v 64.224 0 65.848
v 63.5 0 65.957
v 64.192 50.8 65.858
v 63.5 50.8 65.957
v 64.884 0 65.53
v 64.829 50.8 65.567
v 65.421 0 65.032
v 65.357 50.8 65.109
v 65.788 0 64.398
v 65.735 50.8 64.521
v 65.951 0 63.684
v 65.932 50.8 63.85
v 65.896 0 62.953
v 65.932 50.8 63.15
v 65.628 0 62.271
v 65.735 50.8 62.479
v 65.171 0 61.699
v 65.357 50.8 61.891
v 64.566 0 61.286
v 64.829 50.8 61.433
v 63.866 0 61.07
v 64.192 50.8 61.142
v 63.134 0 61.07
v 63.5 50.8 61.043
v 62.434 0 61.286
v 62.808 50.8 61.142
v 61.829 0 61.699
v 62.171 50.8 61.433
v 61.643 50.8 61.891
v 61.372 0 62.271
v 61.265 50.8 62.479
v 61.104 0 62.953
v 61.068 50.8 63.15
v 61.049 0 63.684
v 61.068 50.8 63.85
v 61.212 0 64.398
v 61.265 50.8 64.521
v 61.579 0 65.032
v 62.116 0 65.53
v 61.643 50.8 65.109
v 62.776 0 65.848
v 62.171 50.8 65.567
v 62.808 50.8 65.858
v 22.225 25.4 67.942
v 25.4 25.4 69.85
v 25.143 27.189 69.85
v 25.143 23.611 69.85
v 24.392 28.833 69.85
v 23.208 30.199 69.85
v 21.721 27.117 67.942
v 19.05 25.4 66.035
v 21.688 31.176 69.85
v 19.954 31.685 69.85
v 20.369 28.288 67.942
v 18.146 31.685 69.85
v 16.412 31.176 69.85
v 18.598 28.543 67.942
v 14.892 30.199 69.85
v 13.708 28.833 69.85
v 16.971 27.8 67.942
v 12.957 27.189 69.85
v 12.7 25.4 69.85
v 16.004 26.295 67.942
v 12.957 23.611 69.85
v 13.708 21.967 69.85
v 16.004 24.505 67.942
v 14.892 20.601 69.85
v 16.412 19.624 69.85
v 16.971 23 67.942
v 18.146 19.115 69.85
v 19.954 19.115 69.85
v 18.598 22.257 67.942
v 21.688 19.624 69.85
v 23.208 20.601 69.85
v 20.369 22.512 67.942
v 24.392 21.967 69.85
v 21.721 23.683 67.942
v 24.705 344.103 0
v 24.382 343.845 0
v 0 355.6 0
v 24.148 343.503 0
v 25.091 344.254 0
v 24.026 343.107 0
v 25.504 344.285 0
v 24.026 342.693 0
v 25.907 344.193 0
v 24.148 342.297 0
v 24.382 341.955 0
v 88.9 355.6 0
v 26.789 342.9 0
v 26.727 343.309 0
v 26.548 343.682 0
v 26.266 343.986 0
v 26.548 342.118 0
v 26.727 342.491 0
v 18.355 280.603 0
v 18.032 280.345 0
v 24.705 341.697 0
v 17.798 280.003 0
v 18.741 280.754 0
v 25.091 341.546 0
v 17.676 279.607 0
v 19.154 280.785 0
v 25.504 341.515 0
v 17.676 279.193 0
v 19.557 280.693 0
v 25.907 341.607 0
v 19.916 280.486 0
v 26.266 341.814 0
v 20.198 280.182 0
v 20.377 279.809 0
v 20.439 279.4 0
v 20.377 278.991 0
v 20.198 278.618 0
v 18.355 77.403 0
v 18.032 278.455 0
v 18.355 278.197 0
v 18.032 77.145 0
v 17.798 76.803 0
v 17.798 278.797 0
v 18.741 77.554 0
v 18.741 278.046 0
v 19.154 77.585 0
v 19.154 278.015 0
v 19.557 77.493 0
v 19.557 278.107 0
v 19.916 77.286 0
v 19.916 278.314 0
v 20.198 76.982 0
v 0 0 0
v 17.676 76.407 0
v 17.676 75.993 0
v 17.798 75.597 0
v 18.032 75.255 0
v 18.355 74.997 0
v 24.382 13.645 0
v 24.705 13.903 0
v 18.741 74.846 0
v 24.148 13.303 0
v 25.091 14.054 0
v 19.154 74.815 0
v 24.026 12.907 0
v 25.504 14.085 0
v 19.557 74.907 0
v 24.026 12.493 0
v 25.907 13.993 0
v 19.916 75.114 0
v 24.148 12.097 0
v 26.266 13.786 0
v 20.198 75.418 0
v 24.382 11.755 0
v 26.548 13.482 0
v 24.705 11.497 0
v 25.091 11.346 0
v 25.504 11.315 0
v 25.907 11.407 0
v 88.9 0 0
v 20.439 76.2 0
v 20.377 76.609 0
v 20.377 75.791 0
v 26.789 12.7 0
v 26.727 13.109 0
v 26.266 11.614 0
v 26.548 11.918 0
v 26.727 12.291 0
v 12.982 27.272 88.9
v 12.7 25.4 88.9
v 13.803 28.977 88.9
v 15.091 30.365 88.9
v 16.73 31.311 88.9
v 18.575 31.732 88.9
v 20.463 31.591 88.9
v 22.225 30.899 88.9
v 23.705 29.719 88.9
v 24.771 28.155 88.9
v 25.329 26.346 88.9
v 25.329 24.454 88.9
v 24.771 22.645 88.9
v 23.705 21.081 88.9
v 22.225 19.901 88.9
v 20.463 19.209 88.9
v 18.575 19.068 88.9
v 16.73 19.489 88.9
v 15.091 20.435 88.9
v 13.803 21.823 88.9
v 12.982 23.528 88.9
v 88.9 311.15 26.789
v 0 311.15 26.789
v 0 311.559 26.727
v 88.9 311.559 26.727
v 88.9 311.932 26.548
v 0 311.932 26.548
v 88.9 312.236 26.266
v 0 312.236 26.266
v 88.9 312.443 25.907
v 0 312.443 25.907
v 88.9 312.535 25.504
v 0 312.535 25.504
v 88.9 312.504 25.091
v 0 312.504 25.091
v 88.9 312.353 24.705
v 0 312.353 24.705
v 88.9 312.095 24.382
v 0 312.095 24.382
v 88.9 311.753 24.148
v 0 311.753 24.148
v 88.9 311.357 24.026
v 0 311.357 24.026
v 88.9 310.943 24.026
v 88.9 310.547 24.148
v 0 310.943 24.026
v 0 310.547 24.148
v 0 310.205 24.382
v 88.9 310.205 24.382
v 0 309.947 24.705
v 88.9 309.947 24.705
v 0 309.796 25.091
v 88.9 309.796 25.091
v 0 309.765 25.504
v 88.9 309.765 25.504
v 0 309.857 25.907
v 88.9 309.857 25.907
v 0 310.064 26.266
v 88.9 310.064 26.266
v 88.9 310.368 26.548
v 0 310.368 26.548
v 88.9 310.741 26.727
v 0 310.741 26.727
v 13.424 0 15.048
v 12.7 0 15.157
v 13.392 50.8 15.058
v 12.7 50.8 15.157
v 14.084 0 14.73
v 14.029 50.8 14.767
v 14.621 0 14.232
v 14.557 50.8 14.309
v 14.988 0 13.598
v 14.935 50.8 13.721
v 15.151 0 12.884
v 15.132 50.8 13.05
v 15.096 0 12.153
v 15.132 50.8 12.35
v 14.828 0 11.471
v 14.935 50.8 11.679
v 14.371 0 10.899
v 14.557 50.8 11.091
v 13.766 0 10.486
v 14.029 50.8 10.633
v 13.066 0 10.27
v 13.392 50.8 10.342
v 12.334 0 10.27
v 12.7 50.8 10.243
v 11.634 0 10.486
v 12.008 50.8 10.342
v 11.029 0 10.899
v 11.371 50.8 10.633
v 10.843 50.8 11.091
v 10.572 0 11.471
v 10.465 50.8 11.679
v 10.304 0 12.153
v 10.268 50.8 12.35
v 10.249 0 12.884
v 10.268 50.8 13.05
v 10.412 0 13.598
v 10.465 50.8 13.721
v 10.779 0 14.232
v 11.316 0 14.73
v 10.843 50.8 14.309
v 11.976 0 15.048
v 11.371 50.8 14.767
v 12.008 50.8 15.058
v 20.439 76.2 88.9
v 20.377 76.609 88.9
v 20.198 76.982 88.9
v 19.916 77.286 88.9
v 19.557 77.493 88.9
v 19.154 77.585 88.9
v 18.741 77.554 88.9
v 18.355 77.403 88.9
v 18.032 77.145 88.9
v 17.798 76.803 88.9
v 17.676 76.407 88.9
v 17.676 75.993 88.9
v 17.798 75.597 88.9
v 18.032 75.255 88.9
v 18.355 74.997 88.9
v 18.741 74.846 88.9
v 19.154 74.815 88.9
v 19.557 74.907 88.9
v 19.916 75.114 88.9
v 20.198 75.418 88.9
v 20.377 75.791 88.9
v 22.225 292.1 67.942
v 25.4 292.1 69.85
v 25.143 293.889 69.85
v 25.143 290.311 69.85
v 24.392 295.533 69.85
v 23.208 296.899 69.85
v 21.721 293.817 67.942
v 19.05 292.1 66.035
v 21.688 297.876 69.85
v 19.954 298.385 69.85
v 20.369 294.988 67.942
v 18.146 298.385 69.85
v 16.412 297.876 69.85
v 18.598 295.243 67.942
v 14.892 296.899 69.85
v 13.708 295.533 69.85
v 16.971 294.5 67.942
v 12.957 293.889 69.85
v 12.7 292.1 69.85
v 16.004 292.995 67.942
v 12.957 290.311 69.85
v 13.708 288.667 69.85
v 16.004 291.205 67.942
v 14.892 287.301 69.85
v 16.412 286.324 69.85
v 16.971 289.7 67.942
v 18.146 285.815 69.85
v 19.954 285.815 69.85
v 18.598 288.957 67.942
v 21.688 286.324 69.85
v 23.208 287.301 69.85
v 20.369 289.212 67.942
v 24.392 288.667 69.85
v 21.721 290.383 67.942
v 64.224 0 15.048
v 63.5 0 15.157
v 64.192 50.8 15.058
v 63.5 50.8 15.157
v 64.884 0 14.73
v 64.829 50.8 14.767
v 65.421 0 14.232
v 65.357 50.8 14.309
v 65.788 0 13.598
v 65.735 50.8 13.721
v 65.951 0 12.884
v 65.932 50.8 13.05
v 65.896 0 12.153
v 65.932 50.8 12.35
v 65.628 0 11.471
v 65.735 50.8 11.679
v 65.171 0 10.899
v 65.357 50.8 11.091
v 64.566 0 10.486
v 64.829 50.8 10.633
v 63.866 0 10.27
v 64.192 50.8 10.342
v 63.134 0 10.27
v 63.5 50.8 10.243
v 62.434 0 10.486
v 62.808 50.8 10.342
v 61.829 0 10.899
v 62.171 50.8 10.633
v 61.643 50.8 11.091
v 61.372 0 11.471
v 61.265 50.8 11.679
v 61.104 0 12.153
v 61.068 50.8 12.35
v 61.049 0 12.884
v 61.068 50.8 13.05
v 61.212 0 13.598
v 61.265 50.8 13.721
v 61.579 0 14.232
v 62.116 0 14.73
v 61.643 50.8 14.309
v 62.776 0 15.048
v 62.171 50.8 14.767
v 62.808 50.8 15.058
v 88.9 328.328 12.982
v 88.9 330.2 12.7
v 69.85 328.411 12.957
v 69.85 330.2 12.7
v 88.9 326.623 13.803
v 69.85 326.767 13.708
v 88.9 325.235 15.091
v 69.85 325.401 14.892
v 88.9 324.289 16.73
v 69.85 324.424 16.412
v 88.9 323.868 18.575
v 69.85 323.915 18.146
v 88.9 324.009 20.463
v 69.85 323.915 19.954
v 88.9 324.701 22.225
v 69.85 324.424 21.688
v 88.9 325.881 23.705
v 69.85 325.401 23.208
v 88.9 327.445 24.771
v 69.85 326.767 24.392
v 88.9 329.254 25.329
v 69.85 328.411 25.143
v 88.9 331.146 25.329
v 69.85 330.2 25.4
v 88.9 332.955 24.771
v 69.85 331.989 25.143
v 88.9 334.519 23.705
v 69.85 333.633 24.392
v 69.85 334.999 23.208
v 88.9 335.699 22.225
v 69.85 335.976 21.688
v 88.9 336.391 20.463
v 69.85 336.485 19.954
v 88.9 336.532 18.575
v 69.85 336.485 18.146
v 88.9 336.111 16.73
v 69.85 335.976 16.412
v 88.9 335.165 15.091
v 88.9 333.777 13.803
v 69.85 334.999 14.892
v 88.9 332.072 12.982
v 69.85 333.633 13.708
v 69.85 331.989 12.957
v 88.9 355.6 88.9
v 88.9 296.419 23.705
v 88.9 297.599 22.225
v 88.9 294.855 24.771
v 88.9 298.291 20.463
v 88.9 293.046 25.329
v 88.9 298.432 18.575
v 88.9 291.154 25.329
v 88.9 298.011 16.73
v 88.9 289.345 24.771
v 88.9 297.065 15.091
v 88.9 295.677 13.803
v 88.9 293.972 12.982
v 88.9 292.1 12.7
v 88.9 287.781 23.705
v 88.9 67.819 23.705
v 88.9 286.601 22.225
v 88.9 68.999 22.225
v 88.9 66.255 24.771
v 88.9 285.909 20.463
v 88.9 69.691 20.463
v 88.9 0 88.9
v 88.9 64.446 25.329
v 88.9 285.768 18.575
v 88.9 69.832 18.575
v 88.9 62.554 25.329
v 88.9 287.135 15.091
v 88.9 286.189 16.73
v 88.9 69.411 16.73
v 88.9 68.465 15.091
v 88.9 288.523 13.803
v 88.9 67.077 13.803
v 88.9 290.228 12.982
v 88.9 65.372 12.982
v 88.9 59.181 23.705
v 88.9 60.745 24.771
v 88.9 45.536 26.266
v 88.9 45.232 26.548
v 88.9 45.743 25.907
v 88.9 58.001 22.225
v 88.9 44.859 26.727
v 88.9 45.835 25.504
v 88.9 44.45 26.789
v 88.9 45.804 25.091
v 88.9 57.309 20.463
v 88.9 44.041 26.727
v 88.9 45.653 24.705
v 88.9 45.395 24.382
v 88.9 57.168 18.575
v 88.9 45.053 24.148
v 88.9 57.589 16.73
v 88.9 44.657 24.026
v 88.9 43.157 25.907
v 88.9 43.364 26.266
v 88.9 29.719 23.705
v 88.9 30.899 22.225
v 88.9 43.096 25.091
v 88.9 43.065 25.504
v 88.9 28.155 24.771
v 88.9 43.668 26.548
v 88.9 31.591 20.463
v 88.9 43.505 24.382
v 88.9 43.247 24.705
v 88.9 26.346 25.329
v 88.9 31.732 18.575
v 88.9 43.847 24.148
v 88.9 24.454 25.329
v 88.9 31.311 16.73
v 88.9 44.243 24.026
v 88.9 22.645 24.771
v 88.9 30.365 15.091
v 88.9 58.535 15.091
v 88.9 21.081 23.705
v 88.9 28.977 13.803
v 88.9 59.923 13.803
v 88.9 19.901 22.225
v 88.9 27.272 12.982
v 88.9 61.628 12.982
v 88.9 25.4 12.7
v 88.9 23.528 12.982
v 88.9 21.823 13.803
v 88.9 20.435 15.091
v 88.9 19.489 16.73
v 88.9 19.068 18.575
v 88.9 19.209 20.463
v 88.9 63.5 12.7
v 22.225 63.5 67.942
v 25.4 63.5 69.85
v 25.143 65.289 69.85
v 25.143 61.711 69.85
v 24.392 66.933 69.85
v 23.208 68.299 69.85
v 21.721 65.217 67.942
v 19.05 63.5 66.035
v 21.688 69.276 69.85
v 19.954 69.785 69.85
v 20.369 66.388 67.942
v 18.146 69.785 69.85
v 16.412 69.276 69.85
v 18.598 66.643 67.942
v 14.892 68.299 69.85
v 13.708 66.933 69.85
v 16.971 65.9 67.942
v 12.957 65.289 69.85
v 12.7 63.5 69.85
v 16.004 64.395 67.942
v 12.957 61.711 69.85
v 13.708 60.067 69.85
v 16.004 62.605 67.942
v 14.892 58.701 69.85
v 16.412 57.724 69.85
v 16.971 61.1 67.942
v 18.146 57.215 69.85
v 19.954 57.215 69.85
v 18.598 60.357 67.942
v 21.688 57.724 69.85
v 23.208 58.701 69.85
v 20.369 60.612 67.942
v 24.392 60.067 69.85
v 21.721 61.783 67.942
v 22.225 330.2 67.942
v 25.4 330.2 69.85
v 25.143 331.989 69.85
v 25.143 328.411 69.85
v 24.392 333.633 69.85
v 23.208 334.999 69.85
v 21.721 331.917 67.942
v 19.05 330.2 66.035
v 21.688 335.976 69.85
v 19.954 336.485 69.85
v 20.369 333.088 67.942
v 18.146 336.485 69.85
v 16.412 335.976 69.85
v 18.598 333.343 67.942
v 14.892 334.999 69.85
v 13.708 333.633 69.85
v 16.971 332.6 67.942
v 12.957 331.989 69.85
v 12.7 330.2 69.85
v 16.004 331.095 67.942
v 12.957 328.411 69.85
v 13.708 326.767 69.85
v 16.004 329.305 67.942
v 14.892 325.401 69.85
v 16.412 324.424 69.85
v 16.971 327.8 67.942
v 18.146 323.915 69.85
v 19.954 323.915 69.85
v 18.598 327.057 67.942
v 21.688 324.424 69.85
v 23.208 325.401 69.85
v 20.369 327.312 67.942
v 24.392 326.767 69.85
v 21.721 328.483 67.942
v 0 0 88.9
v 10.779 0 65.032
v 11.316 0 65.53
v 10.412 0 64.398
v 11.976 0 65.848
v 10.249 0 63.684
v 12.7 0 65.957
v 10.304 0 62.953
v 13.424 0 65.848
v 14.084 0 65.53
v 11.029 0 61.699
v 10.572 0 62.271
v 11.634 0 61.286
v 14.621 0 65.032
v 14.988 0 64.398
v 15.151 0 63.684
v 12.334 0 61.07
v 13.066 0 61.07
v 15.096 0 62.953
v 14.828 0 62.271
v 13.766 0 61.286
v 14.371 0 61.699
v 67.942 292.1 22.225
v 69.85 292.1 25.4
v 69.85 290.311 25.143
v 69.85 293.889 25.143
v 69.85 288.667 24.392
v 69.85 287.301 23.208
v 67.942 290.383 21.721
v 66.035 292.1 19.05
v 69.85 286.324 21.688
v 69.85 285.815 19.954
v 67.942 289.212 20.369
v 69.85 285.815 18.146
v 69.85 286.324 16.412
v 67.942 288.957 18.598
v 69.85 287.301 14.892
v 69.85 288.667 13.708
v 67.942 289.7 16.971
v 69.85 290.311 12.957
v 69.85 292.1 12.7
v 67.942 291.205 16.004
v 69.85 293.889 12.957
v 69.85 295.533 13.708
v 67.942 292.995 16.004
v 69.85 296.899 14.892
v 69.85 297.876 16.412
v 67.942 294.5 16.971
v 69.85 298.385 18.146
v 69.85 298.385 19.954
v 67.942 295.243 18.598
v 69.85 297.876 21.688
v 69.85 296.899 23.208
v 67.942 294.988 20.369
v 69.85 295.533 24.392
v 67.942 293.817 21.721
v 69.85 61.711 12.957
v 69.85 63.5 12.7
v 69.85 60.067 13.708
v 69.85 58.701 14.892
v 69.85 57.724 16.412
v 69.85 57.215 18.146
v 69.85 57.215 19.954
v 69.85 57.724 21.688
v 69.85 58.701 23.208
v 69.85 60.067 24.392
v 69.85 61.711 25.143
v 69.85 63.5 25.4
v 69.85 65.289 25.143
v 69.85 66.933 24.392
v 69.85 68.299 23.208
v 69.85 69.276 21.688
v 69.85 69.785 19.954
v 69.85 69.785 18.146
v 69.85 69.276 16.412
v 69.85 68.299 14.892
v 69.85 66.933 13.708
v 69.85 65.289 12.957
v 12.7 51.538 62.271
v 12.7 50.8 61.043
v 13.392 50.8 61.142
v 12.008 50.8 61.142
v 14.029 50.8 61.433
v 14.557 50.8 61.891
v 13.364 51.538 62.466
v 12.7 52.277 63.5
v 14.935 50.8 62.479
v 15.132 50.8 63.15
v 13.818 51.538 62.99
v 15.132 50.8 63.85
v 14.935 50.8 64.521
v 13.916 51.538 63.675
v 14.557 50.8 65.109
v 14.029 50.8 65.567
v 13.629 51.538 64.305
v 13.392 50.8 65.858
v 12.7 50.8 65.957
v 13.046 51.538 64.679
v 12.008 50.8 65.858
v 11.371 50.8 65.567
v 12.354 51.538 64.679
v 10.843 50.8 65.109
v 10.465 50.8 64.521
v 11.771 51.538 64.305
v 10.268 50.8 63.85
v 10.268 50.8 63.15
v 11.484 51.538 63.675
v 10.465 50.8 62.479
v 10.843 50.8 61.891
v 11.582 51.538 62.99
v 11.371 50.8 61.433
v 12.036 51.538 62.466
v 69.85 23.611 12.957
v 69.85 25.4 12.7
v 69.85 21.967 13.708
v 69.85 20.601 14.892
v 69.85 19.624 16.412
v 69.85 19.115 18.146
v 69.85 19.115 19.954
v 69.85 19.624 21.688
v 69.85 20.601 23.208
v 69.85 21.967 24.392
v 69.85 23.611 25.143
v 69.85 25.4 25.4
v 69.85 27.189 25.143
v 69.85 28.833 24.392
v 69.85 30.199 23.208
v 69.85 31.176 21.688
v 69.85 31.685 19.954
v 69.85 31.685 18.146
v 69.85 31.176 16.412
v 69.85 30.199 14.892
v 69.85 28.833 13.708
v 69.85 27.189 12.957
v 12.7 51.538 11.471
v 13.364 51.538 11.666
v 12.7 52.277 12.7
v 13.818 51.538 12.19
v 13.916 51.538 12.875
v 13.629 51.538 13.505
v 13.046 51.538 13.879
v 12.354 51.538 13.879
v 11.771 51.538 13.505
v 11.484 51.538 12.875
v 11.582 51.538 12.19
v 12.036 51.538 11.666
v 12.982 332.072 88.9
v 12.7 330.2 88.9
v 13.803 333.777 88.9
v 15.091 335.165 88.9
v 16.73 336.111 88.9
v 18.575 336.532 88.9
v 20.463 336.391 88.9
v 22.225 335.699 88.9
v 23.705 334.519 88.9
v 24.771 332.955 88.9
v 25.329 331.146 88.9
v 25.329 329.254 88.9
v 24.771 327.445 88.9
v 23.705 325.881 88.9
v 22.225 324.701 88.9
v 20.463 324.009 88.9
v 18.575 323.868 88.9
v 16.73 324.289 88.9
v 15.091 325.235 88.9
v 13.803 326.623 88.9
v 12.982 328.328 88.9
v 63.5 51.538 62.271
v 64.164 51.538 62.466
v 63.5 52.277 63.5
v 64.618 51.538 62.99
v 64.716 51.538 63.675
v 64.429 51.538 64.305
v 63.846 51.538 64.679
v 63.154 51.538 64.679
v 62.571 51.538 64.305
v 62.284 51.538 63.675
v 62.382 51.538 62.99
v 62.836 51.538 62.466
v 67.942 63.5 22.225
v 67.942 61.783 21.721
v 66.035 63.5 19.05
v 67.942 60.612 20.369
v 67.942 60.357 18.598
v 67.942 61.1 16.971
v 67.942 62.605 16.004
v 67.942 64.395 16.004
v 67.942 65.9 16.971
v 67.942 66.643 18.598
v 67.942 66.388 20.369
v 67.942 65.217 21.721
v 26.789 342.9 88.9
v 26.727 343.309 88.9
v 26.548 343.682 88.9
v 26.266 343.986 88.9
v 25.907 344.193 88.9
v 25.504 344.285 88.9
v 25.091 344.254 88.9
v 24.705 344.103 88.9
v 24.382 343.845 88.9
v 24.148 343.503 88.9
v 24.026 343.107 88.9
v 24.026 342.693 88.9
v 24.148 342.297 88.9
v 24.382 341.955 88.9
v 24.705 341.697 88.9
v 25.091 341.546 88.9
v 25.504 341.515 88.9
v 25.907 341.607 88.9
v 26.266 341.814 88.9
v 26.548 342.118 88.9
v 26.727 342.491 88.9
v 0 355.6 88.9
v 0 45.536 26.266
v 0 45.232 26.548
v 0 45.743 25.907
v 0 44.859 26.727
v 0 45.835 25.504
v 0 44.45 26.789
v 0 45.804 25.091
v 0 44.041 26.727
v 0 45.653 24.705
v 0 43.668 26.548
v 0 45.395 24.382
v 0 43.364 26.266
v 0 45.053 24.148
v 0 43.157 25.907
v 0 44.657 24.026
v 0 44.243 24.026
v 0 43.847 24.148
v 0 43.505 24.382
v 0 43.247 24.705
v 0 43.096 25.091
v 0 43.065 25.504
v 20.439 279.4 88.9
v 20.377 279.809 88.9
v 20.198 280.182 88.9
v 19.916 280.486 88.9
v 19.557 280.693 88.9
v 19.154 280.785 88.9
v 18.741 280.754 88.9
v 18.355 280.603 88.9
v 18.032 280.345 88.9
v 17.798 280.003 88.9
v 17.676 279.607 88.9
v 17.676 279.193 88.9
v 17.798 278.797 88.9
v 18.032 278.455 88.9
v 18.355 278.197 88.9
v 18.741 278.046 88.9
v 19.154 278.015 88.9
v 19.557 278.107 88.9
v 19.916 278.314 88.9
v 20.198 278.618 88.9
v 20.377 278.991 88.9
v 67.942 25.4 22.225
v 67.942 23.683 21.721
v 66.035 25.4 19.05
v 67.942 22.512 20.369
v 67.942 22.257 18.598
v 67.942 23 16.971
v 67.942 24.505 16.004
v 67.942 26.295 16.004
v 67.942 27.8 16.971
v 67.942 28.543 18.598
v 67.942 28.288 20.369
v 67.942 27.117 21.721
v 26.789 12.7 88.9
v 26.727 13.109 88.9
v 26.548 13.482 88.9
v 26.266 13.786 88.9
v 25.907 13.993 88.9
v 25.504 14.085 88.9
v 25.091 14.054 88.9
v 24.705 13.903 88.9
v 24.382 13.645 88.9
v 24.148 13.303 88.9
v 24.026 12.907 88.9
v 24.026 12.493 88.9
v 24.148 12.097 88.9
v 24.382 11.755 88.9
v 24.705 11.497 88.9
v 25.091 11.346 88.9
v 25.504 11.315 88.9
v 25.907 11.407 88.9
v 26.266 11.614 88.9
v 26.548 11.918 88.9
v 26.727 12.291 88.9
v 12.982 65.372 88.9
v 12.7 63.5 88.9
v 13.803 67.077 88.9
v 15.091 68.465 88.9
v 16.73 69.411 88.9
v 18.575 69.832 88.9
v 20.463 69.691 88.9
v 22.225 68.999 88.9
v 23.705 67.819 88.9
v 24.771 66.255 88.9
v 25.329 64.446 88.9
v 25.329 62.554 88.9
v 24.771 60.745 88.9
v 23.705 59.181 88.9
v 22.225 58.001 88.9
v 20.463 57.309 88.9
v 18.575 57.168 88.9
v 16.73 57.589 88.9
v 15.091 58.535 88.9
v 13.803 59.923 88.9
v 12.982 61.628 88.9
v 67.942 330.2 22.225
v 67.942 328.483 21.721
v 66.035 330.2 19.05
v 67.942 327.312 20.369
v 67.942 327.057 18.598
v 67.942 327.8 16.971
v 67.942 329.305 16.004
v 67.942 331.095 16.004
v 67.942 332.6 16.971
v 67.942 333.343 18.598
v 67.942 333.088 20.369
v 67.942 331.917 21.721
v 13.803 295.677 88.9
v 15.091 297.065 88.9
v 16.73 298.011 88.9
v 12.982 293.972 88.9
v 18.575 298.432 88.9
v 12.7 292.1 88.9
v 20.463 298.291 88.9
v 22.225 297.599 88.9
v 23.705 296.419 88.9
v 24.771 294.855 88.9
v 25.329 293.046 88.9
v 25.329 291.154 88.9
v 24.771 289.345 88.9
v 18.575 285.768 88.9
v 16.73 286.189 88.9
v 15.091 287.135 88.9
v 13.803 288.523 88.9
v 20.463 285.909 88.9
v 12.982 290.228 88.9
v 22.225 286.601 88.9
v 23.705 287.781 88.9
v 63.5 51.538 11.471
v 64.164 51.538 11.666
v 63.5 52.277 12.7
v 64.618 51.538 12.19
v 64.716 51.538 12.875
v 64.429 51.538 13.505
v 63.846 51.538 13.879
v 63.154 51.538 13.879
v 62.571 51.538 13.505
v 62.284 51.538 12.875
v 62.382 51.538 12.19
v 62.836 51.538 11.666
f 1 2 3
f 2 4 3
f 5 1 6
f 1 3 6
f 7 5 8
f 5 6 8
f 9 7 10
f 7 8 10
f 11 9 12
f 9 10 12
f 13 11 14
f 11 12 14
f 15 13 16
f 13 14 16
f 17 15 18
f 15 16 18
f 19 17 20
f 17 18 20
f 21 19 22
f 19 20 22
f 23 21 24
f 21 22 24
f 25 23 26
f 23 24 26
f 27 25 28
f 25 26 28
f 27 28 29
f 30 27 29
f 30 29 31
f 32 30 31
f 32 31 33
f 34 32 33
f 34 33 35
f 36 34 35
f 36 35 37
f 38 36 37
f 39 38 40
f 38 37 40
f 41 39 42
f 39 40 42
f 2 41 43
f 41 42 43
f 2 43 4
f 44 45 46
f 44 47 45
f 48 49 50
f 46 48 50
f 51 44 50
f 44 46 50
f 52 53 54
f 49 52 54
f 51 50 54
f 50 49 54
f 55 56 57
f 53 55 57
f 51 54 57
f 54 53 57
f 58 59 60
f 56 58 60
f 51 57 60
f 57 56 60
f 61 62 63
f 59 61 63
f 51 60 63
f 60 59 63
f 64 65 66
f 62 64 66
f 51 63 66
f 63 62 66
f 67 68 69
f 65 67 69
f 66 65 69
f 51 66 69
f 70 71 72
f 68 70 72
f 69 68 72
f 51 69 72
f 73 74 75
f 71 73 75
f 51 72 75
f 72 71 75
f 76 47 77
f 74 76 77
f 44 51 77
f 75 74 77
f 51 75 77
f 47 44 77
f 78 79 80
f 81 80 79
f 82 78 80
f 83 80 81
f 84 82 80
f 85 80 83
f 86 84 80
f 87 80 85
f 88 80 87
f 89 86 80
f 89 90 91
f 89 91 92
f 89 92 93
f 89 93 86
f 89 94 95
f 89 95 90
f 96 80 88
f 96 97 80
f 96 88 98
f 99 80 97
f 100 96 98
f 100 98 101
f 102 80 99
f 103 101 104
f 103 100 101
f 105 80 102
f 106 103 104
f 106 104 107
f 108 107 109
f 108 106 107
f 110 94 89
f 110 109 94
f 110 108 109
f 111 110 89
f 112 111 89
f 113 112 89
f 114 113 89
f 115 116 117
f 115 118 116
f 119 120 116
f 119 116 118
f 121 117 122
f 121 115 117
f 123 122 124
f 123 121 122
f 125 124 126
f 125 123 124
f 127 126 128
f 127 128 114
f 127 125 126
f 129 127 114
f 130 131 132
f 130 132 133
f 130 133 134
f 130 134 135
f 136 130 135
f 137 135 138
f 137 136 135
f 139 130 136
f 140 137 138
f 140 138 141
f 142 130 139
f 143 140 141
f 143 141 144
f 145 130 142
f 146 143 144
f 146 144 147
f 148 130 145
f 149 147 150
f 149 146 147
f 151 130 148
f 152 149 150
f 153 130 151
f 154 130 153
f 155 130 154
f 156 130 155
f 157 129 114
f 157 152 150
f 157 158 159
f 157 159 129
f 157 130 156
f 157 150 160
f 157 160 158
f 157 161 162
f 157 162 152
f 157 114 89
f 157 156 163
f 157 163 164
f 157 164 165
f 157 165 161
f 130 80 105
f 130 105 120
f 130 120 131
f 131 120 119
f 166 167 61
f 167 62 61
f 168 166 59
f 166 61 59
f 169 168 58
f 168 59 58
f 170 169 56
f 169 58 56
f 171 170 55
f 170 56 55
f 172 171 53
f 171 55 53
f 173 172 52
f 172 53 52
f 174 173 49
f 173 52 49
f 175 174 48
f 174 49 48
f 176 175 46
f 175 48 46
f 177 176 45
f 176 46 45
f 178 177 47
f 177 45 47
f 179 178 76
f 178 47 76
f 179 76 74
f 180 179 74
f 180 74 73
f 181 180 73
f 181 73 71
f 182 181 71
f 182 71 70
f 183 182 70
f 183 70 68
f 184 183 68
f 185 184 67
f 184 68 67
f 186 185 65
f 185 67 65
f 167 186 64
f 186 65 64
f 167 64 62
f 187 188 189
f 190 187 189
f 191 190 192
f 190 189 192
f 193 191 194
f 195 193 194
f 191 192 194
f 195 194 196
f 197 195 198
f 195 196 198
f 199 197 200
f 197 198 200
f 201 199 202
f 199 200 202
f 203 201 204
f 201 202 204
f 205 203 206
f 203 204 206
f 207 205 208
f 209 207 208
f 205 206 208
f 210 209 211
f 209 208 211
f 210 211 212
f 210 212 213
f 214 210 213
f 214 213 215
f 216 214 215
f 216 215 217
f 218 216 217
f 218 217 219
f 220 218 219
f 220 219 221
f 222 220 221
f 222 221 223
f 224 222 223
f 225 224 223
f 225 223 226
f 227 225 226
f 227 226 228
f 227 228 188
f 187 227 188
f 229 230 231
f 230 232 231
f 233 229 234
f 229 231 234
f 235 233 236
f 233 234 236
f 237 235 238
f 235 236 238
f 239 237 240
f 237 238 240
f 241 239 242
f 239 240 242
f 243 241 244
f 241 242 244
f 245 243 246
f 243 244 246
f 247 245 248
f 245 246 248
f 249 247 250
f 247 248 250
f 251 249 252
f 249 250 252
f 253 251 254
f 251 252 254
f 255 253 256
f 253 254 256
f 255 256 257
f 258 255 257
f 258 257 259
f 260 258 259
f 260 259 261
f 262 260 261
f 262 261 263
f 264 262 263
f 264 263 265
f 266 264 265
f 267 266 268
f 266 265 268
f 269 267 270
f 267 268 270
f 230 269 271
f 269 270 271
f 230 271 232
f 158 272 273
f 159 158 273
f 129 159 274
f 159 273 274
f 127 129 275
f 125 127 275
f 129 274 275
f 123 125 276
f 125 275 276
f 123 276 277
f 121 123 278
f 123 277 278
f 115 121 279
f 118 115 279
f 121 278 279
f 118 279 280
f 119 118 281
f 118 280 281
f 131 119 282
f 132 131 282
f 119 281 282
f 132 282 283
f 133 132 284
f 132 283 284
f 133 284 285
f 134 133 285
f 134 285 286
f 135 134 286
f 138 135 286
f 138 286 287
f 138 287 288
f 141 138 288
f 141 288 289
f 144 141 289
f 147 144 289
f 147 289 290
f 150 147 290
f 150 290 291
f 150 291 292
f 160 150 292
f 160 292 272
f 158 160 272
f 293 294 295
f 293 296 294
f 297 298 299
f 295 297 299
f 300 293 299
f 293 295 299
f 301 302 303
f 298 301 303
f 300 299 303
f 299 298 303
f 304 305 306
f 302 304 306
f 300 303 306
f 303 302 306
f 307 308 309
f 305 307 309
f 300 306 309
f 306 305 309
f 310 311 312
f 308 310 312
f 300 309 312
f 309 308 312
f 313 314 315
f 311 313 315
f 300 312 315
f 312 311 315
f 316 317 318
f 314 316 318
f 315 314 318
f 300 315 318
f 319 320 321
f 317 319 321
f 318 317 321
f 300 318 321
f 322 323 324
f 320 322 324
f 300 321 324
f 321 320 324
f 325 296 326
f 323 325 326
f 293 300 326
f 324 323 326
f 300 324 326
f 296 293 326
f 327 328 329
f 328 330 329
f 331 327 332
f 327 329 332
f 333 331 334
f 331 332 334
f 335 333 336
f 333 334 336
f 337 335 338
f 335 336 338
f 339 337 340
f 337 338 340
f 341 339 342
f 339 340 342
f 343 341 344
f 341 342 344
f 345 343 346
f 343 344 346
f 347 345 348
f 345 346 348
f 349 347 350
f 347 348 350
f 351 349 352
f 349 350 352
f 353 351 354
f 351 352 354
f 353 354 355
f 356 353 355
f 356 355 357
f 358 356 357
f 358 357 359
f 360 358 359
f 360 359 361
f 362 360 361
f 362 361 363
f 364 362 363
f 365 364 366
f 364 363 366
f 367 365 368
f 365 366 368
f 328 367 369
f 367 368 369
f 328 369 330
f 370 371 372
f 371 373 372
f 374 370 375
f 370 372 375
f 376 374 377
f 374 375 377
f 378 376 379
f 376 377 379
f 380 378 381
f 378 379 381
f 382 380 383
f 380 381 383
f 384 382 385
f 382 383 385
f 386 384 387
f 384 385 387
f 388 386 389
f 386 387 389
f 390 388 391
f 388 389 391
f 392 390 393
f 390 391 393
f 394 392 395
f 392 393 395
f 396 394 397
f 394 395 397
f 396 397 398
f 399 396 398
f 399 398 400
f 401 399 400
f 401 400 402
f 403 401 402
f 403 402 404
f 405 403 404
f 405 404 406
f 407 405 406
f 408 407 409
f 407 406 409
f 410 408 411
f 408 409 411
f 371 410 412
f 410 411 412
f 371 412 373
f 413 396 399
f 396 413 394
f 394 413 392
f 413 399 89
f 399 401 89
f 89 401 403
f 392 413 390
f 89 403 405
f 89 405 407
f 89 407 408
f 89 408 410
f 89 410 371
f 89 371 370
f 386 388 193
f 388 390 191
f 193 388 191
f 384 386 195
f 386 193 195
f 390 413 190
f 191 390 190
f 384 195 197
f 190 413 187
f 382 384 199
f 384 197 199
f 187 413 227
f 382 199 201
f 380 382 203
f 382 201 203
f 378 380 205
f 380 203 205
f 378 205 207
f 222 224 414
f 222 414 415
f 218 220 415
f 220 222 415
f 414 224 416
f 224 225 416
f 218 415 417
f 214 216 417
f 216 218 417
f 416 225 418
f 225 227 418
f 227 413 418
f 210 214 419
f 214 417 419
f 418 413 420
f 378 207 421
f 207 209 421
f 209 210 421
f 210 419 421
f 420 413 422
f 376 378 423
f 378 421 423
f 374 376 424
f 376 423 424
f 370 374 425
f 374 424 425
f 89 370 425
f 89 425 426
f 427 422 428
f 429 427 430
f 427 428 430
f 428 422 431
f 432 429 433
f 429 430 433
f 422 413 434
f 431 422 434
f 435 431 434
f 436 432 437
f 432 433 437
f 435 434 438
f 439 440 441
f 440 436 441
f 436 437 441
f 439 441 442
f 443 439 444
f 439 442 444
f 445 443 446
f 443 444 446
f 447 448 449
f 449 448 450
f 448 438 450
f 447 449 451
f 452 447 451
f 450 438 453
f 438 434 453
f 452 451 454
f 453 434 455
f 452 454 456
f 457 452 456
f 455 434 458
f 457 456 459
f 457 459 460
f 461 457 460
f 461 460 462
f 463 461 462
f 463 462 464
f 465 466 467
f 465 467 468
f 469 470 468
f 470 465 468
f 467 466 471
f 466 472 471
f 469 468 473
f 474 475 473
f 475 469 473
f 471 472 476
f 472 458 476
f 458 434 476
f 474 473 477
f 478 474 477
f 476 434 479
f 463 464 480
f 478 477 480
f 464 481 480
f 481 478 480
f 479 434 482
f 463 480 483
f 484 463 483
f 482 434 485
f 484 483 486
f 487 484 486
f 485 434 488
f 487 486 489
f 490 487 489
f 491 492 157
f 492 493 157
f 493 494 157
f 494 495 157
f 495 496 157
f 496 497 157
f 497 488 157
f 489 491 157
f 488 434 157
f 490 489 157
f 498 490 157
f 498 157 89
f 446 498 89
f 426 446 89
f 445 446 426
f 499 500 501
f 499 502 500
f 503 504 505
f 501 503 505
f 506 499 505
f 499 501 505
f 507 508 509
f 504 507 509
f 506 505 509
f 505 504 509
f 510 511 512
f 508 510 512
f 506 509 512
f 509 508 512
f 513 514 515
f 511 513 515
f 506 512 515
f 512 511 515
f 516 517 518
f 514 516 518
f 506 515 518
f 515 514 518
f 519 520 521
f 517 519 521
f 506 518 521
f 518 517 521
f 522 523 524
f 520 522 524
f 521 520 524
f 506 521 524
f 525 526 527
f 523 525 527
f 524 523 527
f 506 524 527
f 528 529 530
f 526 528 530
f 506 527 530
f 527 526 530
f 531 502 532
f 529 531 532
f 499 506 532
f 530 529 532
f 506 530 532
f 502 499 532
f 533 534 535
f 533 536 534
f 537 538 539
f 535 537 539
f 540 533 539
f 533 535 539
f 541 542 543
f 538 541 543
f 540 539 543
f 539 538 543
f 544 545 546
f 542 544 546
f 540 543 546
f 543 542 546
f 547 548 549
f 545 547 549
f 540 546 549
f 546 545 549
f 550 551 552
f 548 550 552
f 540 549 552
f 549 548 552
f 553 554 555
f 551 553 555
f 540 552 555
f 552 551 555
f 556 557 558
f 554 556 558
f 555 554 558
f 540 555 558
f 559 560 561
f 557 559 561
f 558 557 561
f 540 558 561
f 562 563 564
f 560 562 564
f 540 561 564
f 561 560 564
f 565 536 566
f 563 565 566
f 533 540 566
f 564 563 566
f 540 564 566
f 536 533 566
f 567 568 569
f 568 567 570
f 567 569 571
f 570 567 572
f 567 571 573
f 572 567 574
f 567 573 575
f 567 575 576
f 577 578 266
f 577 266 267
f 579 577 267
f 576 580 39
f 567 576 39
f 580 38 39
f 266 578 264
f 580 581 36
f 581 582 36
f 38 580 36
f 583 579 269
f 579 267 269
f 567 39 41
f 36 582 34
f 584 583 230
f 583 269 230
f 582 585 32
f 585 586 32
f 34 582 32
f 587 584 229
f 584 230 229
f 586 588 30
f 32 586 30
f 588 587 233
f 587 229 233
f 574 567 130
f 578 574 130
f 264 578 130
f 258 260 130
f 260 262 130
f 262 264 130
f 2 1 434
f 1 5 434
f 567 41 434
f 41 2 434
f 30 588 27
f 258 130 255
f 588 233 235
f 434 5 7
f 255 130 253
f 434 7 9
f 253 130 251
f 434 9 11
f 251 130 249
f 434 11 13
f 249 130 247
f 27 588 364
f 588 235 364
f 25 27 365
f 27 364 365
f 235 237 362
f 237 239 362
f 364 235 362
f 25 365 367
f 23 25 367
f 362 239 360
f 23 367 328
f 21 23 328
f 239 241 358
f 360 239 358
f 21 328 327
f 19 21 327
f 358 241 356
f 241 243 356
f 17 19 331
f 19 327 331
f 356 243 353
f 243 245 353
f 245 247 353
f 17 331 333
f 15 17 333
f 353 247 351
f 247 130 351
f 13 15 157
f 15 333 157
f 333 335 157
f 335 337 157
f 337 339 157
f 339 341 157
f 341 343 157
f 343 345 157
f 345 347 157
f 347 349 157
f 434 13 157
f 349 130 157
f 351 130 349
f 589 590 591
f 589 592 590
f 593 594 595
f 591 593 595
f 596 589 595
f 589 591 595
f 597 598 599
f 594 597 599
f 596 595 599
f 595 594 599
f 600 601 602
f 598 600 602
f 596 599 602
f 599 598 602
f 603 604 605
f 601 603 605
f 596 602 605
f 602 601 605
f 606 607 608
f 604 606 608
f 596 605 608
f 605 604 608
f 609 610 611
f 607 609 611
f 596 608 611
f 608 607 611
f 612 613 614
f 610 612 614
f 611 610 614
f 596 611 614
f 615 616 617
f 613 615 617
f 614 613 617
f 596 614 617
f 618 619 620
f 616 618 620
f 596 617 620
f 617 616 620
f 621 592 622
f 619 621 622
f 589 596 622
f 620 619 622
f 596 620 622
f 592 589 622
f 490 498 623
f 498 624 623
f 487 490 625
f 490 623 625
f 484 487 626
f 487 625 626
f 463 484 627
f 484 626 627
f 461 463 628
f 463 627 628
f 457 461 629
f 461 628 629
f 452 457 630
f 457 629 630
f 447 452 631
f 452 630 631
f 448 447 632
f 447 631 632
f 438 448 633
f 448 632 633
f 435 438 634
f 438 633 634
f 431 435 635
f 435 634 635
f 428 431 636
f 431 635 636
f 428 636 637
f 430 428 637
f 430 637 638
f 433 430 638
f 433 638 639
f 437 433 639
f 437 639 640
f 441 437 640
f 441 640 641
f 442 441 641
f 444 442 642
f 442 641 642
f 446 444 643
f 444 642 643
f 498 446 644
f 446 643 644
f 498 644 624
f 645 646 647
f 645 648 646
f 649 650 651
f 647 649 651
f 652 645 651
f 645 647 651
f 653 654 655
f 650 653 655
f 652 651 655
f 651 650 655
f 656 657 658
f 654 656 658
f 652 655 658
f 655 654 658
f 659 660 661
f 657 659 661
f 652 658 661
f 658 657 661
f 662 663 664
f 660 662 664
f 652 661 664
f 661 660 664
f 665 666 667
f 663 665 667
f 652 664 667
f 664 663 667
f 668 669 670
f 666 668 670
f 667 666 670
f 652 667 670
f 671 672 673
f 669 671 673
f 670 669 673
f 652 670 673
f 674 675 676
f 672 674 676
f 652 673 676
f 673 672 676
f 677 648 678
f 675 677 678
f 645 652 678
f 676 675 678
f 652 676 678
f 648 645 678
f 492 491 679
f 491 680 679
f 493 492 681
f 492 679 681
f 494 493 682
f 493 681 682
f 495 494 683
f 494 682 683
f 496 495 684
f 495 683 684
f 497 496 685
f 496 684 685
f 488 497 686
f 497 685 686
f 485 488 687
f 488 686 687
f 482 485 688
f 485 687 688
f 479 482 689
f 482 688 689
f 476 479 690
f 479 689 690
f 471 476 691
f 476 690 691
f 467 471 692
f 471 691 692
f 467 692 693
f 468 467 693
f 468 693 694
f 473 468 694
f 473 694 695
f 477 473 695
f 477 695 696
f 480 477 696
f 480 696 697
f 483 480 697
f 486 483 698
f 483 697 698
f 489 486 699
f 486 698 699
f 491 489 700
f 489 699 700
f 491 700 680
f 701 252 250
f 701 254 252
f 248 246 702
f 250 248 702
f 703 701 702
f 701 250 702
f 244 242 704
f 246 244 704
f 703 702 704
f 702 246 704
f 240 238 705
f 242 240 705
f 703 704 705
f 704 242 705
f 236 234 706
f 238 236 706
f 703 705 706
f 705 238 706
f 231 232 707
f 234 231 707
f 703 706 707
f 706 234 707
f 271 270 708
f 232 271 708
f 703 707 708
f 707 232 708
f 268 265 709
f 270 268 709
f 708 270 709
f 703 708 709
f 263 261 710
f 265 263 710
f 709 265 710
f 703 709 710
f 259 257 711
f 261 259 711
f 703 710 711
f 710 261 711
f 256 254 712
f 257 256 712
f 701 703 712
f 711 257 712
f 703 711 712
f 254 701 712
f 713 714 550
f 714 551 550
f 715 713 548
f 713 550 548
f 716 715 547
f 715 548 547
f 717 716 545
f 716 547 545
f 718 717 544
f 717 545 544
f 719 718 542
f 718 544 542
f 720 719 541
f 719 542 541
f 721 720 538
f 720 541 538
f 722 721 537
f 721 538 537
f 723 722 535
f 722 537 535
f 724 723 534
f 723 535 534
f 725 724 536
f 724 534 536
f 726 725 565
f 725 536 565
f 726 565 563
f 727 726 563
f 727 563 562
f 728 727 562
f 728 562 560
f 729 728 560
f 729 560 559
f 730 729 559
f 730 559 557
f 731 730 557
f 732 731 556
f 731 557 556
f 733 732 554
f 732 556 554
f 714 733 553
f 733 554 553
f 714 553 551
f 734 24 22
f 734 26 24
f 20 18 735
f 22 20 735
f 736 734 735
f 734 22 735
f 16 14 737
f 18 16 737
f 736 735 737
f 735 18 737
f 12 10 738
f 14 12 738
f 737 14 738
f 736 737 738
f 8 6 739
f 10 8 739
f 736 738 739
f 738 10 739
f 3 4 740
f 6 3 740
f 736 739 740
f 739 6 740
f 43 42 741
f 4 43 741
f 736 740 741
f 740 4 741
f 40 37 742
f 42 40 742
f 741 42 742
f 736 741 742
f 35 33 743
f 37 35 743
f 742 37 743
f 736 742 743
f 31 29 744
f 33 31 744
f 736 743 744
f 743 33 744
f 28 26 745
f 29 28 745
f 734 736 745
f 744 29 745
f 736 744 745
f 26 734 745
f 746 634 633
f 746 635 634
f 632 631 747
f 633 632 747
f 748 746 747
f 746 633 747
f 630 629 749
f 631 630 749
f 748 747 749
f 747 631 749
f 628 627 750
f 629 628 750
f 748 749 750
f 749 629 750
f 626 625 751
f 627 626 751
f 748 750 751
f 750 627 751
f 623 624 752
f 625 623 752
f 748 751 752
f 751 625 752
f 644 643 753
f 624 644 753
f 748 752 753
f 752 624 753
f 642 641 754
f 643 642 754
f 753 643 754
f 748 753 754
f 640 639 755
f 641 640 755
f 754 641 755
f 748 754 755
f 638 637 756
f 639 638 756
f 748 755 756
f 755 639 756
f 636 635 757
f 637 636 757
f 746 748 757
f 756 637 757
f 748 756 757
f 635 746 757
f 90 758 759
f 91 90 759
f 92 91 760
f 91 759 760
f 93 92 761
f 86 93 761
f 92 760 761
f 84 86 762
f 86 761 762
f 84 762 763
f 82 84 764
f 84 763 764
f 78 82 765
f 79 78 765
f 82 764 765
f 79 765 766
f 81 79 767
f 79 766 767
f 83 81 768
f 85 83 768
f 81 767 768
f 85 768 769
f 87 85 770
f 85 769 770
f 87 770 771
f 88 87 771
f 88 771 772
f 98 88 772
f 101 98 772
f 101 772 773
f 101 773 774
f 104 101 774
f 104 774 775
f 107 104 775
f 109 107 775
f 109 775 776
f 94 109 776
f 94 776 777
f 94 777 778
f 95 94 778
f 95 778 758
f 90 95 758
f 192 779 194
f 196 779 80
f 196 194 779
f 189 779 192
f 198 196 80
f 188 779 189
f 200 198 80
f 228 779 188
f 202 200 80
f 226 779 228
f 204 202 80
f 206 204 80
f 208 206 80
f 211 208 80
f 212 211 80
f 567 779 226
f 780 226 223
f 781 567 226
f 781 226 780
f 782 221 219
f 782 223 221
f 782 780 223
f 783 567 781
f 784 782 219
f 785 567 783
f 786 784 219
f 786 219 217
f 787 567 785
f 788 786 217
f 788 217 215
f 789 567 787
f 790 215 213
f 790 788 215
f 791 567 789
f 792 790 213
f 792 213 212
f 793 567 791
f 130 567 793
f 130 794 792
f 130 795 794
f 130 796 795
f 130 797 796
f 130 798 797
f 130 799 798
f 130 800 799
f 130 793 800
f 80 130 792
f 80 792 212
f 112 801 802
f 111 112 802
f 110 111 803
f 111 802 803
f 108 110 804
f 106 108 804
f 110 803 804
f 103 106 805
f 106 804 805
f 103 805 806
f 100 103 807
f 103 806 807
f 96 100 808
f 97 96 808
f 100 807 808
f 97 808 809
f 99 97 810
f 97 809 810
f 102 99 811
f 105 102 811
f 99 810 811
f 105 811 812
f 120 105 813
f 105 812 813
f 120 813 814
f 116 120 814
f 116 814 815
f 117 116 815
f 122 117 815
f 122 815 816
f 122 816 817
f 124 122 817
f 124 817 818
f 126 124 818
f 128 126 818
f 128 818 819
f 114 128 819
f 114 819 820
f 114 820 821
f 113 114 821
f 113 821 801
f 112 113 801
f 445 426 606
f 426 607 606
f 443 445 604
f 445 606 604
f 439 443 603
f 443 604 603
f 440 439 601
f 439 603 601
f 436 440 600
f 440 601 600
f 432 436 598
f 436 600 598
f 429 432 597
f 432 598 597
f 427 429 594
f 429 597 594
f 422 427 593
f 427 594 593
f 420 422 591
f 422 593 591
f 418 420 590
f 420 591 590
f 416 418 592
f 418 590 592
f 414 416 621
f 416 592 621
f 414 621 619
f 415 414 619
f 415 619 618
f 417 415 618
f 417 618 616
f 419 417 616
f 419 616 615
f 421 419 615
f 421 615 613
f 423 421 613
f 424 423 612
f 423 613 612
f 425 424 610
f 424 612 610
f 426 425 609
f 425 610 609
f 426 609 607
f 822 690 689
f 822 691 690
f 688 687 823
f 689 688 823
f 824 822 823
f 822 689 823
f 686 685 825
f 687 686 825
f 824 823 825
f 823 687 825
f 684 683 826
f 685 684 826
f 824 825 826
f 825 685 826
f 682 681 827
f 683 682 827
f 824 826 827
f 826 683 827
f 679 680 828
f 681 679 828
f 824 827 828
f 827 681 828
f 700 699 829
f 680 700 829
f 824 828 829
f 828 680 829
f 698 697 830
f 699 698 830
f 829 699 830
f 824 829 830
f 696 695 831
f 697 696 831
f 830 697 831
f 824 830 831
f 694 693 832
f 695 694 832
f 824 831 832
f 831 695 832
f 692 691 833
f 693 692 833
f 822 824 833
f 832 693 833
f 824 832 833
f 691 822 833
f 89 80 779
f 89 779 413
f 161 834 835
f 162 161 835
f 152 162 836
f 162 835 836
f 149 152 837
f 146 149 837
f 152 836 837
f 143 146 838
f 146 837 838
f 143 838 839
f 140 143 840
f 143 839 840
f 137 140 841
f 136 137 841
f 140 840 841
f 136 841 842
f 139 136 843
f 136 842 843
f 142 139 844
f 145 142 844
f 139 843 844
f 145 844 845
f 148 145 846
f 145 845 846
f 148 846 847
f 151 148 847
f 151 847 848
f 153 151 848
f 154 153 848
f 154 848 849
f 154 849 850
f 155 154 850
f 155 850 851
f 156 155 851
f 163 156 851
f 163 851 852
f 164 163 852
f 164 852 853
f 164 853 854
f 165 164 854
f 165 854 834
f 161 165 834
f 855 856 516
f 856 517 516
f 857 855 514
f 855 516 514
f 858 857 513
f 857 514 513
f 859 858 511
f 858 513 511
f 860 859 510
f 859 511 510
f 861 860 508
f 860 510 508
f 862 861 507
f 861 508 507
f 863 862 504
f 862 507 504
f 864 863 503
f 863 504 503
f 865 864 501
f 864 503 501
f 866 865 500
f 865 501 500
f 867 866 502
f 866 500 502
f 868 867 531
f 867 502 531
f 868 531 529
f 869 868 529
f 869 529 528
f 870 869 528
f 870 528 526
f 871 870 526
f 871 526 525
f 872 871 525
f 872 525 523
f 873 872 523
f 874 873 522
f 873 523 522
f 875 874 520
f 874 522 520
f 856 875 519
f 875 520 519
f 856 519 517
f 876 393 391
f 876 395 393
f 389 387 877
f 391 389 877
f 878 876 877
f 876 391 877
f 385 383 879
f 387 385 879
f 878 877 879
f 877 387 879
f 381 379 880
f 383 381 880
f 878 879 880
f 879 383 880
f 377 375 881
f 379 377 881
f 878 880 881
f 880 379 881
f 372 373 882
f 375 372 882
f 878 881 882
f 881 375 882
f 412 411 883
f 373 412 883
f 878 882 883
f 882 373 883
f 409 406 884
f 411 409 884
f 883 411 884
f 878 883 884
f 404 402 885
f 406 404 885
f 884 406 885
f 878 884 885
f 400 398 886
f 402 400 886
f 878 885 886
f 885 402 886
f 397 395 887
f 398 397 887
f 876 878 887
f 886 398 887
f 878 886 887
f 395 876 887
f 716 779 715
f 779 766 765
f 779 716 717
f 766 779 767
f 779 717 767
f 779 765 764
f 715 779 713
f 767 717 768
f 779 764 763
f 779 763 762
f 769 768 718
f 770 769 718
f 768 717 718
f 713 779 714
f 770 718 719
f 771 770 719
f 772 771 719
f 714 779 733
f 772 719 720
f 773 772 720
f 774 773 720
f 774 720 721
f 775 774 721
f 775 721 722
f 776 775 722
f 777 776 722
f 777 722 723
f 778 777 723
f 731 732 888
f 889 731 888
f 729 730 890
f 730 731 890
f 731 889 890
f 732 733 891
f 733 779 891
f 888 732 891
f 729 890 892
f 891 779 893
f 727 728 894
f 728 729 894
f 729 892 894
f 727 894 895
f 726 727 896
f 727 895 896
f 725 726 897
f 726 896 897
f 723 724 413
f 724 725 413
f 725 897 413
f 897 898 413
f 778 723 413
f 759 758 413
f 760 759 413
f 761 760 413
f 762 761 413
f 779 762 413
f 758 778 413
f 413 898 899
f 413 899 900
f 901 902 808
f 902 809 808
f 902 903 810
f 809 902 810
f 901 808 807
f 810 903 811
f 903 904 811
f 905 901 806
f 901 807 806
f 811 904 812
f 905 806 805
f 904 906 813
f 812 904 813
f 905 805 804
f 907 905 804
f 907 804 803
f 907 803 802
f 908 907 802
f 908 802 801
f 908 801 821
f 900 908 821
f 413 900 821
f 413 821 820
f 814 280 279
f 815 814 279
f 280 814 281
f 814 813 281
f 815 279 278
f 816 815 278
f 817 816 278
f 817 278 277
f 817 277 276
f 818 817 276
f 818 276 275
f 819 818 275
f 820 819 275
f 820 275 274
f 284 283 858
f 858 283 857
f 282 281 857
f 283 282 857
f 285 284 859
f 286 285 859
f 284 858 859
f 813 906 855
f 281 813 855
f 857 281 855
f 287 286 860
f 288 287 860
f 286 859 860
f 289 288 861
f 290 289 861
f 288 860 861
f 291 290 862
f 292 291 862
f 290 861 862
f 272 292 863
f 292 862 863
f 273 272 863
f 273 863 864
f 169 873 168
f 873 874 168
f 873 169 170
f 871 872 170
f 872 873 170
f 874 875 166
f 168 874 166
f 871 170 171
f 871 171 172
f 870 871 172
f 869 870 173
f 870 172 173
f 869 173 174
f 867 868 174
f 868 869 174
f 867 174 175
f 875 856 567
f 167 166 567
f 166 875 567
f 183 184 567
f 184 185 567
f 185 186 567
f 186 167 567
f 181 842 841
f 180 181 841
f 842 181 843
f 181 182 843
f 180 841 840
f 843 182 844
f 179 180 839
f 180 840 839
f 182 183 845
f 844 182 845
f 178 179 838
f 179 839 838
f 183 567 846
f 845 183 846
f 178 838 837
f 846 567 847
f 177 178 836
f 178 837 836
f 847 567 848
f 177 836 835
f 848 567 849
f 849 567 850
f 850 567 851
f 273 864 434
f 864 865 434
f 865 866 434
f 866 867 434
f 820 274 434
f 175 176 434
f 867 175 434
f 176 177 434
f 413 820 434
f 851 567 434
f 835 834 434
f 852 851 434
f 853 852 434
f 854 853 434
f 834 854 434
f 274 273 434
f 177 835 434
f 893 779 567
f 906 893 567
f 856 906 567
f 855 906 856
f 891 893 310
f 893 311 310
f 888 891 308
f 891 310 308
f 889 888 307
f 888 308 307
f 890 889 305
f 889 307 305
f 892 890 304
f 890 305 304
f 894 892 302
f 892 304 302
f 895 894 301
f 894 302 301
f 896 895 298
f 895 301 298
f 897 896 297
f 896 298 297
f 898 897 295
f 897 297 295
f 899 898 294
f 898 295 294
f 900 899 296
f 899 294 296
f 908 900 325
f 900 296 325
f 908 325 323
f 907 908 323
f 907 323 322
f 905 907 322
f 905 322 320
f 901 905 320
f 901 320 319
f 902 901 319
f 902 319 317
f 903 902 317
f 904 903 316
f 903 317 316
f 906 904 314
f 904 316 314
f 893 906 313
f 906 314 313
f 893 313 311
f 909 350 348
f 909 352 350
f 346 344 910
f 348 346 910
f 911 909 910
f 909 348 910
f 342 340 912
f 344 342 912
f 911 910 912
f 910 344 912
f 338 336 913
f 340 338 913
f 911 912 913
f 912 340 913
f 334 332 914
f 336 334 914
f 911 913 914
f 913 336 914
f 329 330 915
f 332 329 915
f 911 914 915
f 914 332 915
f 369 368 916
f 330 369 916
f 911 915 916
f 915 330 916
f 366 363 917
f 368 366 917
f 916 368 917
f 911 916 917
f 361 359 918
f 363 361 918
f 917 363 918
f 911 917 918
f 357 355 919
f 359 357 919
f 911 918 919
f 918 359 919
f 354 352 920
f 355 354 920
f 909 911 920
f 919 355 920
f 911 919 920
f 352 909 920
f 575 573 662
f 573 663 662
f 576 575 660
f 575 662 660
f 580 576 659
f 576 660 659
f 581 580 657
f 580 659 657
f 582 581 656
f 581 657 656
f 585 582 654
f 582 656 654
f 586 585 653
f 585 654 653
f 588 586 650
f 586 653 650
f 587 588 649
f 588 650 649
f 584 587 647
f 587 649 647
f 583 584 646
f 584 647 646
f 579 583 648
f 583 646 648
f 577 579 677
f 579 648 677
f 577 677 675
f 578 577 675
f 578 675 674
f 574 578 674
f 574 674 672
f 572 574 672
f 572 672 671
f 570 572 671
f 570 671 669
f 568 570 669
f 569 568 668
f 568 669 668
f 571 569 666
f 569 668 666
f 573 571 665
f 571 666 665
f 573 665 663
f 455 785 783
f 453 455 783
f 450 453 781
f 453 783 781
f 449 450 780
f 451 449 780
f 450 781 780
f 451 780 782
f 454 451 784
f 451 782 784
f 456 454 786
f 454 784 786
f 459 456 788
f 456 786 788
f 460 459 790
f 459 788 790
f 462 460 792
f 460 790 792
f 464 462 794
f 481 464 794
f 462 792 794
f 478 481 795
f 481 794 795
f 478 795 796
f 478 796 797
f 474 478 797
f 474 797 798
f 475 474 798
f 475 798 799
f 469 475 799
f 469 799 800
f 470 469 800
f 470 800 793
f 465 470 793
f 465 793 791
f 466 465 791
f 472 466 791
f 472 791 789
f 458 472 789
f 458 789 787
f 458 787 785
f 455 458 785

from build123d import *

# Parameters (mm, degrees)
SKETCH1_W                                = 88.9
SKETCH1_H                                = 88.9
BOSS_EXTRUDE1_DEPTH                      = 355.6
SKETCH2_R                                = 1.3890625
CUT_EXTRUDE1_DEPTH                       = 1
CUT_EXTRUDE1_DEPTH_BACK                  = 89.9
SKETCH3_R                                = 1.3890625
CUT_EXTRUDE2_DEPTH                       = 1
CUT_EXTRUDE2_DEPTH_BACK                  = 89.9
F_1_2_0_5_DIAMETER_HOLE1_D               = 12.7
F_1_2_0_5_DIAMETER_HOLE1_DEPTH           = 19.05
F_1_2_0_5_DIAMETER_HOLE1_TIP             = 3.815464931
F_1_2_0_5_DIAMETER_HOLE1_ON_FACE_2_D     = 12.7
F_1_2_0_5_DIAMETER_HOLE1_ON_FACE_2_DEPTH = 19.05
F_1_2_0_5_DIAMETER_HOLE1_ON_FACE_2_TIP   = 3.815464931
F_10_0_1935_DIAMETER_HOLE1_D             = 4.9149
F_10_0_1935_DIAMETER_HOLE1_DEPTH         = 50.8
F_10_0_1935_DIAMETER_HOLE1_TIP           = 1.476584928


with BuildPart() as part:
    # Sketch1 → Boss-Extrude1 (new body)
    with BuildSketch(Plane(origin=(0, 0, 0), x_dir=(1, 0, 0), z_dir=(0, 1, 0))):
        with Locations((44.45, -44.45)):
            Rectangle(SKETCH1_W, SKETCH1_H)
    extrude(amount=BOSS_EXTRUDE1_DEPTH)

    # Sketch2 → Cut-Extrude1 (cut, two sides)
    with BuildSketch(Plane.XY.offset(88.9)) as cut_extrude1_sk:
        with Locations((19.05, 76.2)):
            Circle(SKETCH2_R)
        with Locations((19.05, 279.4)):
            Circle(SKETCH2_R)
        with Locations((25.4, 342.9)):
            Circle(SKETCH2_R)
        with Locations((25.4, 12.7)):
            Circle(SKETCH2_R)
    extrude(amount=CUT_EXTRUDE1_DEPTH, mode=Mode.SUBTRACT)
    extrude(cut_extrude1_sk.sketch, amount=-CUT_EXTRUDE1_DEPTH_BACK, mode=Mode.SUBTRACT)

    # Sketch3 → Cut-Extrude2 (cut, two sides)
    with BuildSketch(Plane.ZY) as cut_extrude2_sk:
        with Locations((25.4, 311.15)):
            Circle(SKETCH3_R)
        with Locations((25.4, 44.45)):
            Circle(SKETCH3_R)
    extrude(amount=CUT_EXTRUDE2_DEPTH, mode=Mode.SUBTRACT)
    extrude(cut_extrude2_sk.sketch, amount=-CUT_EXTRUDE2_DEPTH_BACK, mode=Mode.SUBTRACT)

    # 1/2 (0.5) Diameter Hole1
    with Locations(Plane(origin=(19.05, 292.1, 88.9), x_dir=(1, 0, 0), z_dir=(0, 0, 1))):
        with Locations((0, 0), (0, 38.1), (0, -266.7), (0, -228.6)):
            Hole(F_1_2_0_5_DIAMETER_HOLE1_D / 2, depth=F_1_2_0_5_DIAMETER_HOLE1_DEPTH)
            with Locations((0, 0, -(F_1_2_0_5_DIAMETER_HOLE1_DEPTH + F_1_2_0_5_DIAMETER_HOLE1_TIP / 2))):  # 118° drill point
                Cone(0, F_1_2_0_5_DIAMETER_HOLE1_D / 2, F_1_2_0_5_DIAMETER_HOLE1_TIP, mode=Mode.SUBTRACT)

    # 1/2 (0.5) Diameter Hole1 on face 2
    with Locations(Plane(origin=(88.9, 63.5, 19.05), x_dir=(0, 0, 1), z_dir=(1, 0, 0))):
        with Locations((0, 0), (0, 38.1), (0, -266.7), (0, -228.6)):
            Hole(F_1_2_0_5_DIAMETER_HOLE1_ON_FACE_2_D / 2, depth=F_1_2_0_5_DIAMETER_HOLE1_ON_FACE_2_DEPTH)
            with Locations((0, 0, -(F_1_2_0_5_DIAMETER_HOLE1_ON_FACE_2_DEPTH + F_1_2_0_5_DIAMETER_HOLE1_ON_FACE_2_TIP / 2))):  # 118° drill point
                Cone(0, F_1_2_0_5_DIAMETER_HOLE1_ON_FACE_2_D / 2, F_1_2_0_5_DIAMETER_HOLE1_ON_FACE_2_TIP, mode=Mode.SUBTRACT)

    # #10 (0.1935) Diameter Hole1
    with Locations(Plane(origin=(12.7, 0, 63.5), x_dir=(0, 0, -1), z_dir=(0, -1, 0))):
        with Locations((0, 0), (0, 50.8), (50.8, 50.8), (50.8, 0)):
            Hole(F_10_0_1935_DIAMETER_HOLE1_D / 2, depth=F_10_0_1935_DIAMETER_HOLE1_DEPTH)
            with Locations((0, 0, -(F_10_0_1935_DIAMETER_HOLE1_DEPTH + F_10_0_1935_DIAMETER_HOLE1_TIP / 2))):  # 118° drill point
                Cone(0, F_10_0_1935_DIAMETER_HOLE1_D / 2, F_10_0_1935_DIAMETER_HOLE1_TIP, mode=Mode.SUBTRACT)


solid = part.part
